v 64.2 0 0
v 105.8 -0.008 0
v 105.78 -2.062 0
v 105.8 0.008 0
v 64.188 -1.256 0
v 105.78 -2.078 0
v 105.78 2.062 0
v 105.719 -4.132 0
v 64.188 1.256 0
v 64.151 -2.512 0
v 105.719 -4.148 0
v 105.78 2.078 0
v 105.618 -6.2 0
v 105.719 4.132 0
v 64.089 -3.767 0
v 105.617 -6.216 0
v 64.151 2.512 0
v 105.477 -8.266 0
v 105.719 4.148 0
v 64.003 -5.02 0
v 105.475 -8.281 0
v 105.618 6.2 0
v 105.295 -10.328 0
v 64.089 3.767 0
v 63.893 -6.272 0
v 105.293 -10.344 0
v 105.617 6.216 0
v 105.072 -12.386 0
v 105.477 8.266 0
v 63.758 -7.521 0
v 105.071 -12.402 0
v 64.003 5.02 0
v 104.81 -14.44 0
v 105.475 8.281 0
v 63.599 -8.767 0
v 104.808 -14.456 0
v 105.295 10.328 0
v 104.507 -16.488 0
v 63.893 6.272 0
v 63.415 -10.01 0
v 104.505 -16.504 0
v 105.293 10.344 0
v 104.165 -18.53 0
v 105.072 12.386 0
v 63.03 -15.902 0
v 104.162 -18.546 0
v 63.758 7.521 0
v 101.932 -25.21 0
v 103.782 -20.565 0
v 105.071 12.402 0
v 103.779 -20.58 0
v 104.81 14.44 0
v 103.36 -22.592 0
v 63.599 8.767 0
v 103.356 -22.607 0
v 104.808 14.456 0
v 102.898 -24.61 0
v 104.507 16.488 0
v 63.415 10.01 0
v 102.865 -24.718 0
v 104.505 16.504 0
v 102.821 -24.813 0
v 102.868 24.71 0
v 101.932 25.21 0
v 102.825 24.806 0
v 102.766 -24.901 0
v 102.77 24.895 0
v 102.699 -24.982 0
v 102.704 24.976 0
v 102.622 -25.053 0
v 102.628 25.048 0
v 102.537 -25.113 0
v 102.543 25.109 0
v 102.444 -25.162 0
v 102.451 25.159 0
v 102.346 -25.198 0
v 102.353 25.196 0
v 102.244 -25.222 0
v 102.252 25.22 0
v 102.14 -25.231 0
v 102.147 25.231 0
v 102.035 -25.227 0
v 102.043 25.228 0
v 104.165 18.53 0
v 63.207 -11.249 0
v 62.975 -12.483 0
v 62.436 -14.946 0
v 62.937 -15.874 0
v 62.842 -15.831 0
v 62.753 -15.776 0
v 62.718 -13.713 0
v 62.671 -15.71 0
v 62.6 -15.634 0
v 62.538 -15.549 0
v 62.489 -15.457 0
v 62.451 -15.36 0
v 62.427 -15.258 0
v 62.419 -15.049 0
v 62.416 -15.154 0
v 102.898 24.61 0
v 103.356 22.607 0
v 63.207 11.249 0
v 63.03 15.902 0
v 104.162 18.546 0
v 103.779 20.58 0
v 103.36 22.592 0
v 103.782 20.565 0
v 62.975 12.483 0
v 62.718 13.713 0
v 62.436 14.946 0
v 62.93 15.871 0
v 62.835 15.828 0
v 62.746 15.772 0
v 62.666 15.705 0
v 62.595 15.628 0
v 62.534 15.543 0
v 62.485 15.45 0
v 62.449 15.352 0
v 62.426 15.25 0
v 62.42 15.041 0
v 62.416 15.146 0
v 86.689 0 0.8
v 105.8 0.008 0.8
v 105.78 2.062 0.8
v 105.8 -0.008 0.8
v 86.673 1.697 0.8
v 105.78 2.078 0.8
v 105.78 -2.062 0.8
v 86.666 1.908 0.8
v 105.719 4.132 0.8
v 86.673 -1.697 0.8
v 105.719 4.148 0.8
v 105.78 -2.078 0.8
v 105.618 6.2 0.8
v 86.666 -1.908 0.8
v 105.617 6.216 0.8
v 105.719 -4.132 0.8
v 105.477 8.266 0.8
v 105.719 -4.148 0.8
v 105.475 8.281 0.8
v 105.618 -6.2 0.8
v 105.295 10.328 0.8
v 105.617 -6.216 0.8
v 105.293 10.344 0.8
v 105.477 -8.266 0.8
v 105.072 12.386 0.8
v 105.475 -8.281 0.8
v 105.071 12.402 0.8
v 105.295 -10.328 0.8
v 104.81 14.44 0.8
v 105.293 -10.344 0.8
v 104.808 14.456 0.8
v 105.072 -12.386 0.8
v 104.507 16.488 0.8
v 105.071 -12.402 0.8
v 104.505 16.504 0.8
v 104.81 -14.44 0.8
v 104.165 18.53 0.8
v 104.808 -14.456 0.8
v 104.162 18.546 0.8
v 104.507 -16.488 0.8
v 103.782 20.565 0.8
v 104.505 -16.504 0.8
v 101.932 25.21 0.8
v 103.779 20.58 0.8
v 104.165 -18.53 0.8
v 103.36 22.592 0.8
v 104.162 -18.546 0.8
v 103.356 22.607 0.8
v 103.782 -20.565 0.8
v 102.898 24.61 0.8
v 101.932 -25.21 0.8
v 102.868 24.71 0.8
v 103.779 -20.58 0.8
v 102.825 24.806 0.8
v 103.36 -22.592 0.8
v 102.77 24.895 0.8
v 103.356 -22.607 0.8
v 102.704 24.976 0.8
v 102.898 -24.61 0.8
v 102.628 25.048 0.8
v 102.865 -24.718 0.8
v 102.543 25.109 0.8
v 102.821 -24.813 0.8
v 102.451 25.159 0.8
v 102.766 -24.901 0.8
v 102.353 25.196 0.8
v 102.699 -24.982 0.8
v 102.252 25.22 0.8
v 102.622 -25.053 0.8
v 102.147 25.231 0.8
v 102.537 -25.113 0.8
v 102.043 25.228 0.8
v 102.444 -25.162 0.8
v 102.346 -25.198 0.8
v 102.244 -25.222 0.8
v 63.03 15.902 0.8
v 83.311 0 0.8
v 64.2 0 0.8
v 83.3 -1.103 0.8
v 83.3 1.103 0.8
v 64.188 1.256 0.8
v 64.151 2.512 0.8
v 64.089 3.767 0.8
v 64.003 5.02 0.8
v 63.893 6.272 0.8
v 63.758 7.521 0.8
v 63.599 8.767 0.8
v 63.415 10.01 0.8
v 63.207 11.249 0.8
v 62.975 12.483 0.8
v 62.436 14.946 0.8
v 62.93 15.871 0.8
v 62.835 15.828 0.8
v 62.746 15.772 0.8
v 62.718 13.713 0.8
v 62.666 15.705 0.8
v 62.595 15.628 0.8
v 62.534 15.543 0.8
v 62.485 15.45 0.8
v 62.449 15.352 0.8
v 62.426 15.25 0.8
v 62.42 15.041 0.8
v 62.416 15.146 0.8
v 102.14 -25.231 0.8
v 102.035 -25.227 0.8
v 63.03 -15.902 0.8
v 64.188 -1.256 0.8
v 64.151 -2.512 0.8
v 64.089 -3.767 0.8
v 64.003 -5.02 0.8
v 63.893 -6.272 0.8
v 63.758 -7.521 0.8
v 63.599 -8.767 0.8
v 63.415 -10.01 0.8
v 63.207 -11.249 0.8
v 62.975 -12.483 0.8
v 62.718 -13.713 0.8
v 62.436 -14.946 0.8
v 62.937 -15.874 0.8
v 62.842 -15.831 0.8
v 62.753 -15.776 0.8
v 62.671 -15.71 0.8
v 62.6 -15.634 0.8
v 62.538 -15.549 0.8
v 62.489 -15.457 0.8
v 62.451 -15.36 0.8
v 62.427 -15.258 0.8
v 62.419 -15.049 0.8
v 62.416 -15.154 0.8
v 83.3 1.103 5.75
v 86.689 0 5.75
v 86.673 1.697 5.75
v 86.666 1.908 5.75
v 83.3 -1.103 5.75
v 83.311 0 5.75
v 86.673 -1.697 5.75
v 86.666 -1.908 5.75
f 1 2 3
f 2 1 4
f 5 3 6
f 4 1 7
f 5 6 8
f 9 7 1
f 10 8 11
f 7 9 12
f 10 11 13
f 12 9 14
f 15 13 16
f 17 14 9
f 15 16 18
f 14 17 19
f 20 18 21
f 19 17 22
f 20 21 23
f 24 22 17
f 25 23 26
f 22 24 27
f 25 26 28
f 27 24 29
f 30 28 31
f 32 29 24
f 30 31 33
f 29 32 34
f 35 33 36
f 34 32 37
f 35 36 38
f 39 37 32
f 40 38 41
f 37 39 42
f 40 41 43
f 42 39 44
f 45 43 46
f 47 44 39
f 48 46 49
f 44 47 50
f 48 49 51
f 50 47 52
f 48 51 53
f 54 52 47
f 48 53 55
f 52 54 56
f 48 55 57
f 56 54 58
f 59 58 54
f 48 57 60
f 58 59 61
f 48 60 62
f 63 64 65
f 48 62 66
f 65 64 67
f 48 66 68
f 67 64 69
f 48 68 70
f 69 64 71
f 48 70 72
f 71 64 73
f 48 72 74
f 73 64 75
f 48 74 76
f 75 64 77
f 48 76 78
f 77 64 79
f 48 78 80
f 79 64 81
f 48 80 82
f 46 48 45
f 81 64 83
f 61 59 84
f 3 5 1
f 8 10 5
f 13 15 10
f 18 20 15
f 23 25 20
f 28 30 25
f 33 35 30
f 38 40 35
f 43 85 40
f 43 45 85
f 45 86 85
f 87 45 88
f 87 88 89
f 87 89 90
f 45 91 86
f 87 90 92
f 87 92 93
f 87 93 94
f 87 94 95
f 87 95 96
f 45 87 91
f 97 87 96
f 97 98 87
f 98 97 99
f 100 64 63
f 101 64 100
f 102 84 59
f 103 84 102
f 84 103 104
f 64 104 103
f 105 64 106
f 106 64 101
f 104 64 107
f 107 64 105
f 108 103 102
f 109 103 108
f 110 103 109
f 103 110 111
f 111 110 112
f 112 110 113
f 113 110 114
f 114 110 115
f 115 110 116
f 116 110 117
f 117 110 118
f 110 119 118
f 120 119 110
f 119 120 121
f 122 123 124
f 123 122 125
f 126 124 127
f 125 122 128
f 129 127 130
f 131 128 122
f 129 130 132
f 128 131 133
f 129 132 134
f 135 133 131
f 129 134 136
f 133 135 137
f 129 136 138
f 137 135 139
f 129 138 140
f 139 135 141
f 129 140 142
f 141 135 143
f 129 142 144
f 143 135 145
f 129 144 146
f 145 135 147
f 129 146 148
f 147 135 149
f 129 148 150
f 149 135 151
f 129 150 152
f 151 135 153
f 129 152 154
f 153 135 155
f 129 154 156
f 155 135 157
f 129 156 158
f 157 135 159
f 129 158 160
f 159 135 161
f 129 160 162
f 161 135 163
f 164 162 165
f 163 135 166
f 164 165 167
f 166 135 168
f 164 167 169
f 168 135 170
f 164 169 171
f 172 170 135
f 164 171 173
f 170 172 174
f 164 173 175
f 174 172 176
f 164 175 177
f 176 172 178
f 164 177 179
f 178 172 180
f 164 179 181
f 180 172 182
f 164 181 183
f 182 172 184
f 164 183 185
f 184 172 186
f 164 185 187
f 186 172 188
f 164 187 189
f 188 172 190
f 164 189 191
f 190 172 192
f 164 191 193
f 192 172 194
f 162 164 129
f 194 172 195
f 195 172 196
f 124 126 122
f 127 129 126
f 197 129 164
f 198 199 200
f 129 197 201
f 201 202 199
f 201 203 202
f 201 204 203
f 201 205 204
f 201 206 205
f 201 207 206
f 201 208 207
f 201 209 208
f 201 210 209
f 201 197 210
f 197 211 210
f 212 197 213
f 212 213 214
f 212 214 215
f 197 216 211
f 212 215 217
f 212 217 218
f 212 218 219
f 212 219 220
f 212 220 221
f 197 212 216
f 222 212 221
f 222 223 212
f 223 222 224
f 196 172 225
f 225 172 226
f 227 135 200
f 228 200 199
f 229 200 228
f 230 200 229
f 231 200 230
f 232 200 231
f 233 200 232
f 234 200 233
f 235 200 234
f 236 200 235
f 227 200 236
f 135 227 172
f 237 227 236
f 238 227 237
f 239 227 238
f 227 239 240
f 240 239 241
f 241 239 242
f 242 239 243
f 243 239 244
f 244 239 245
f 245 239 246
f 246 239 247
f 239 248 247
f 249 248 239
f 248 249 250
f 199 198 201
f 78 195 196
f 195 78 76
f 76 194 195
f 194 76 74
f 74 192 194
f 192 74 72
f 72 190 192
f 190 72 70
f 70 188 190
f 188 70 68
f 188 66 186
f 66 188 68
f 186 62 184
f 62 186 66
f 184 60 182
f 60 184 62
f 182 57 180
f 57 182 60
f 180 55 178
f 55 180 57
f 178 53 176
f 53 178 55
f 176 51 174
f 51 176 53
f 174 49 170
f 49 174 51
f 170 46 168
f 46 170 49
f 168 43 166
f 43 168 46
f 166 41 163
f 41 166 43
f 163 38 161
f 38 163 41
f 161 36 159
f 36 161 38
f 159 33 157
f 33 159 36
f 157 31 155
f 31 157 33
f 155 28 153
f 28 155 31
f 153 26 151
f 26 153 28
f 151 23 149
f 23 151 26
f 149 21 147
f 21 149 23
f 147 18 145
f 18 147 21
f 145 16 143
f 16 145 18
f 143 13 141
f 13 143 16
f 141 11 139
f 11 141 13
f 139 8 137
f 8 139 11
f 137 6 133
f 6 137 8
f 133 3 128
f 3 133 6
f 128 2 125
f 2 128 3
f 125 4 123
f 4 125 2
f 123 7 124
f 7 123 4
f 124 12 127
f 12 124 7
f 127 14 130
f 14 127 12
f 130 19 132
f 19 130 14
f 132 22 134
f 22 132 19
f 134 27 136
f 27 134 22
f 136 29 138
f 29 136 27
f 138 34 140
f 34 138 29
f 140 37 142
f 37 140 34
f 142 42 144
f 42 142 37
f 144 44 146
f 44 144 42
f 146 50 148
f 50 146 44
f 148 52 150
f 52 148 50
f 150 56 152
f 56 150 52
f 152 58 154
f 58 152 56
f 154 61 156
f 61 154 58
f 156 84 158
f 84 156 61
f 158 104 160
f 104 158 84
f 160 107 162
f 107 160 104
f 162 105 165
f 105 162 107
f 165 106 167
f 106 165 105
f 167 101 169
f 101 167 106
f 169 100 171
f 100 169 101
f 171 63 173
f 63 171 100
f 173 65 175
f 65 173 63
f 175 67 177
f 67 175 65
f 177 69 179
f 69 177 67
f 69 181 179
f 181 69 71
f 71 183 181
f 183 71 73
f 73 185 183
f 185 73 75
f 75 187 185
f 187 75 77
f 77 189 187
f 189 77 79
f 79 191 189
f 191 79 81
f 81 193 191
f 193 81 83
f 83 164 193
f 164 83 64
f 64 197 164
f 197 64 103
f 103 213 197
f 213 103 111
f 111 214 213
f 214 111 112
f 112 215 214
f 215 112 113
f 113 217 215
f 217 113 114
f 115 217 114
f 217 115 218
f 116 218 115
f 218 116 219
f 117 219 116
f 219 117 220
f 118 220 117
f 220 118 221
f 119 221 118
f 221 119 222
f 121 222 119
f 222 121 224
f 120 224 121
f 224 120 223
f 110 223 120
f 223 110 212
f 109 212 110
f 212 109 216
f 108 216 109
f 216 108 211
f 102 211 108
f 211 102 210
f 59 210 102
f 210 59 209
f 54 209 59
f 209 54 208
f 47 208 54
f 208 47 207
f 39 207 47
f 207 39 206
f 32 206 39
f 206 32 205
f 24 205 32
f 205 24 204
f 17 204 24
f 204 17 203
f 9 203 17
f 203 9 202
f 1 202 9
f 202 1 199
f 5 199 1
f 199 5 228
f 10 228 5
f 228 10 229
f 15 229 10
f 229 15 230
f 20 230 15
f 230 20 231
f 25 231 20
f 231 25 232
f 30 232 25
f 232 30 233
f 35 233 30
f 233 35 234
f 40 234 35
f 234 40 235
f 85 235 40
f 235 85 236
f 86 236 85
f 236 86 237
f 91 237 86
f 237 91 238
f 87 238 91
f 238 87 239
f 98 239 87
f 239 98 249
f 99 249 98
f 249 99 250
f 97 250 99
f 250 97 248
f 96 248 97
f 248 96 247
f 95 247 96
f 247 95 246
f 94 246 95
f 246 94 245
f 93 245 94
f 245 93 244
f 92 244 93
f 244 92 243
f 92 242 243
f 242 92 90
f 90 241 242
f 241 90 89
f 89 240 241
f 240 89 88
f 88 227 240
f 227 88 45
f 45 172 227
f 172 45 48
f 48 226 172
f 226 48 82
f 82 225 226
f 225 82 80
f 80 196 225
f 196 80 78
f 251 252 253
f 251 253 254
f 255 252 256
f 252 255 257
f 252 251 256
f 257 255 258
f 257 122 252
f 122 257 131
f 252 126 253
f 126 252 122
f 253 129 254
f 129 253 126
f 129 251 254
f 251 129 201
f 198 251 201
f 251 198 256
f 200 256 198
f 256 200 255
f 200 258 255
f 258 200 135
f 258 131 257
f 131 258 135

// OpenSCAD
// Gen-CK — bobbin BASE (bottom flange + hub). Print x12, flange down. Wind 26 AWG x 370 t around
// the hub with the LID glued on (coil_lid.stl). Copper lives ONLY between the flanges (no proud winds).
include <parameters.scad>;
$fn = 48;
module sector_2d(r_in, r_out, ang) {
    polygon([
        for (a = [-ang/2 : ang/24 : ang/2]) [r_in*cos(a), r_in*sin(a)],
        for (a = [ang/2 : -ang/24 : -ang/2]) [r_out*cos(a), r_out*sin(a)]
    ]);
}
module footprint_2d() { offset(r=wall) sector_2d(coil_id_r, coil_od_r, span_deg); }
module hub_2d()       { offset(delta=-coil_core_inset) sector_2d(coil_id_r, coil_od_r, span_deg); }

union() {
    linear_extrude(flange_t) footprint_2d();
    translate([0, 0, flange_t - 0.01]) linear_extrude(former_web + 0.01) hub_2d();
}
